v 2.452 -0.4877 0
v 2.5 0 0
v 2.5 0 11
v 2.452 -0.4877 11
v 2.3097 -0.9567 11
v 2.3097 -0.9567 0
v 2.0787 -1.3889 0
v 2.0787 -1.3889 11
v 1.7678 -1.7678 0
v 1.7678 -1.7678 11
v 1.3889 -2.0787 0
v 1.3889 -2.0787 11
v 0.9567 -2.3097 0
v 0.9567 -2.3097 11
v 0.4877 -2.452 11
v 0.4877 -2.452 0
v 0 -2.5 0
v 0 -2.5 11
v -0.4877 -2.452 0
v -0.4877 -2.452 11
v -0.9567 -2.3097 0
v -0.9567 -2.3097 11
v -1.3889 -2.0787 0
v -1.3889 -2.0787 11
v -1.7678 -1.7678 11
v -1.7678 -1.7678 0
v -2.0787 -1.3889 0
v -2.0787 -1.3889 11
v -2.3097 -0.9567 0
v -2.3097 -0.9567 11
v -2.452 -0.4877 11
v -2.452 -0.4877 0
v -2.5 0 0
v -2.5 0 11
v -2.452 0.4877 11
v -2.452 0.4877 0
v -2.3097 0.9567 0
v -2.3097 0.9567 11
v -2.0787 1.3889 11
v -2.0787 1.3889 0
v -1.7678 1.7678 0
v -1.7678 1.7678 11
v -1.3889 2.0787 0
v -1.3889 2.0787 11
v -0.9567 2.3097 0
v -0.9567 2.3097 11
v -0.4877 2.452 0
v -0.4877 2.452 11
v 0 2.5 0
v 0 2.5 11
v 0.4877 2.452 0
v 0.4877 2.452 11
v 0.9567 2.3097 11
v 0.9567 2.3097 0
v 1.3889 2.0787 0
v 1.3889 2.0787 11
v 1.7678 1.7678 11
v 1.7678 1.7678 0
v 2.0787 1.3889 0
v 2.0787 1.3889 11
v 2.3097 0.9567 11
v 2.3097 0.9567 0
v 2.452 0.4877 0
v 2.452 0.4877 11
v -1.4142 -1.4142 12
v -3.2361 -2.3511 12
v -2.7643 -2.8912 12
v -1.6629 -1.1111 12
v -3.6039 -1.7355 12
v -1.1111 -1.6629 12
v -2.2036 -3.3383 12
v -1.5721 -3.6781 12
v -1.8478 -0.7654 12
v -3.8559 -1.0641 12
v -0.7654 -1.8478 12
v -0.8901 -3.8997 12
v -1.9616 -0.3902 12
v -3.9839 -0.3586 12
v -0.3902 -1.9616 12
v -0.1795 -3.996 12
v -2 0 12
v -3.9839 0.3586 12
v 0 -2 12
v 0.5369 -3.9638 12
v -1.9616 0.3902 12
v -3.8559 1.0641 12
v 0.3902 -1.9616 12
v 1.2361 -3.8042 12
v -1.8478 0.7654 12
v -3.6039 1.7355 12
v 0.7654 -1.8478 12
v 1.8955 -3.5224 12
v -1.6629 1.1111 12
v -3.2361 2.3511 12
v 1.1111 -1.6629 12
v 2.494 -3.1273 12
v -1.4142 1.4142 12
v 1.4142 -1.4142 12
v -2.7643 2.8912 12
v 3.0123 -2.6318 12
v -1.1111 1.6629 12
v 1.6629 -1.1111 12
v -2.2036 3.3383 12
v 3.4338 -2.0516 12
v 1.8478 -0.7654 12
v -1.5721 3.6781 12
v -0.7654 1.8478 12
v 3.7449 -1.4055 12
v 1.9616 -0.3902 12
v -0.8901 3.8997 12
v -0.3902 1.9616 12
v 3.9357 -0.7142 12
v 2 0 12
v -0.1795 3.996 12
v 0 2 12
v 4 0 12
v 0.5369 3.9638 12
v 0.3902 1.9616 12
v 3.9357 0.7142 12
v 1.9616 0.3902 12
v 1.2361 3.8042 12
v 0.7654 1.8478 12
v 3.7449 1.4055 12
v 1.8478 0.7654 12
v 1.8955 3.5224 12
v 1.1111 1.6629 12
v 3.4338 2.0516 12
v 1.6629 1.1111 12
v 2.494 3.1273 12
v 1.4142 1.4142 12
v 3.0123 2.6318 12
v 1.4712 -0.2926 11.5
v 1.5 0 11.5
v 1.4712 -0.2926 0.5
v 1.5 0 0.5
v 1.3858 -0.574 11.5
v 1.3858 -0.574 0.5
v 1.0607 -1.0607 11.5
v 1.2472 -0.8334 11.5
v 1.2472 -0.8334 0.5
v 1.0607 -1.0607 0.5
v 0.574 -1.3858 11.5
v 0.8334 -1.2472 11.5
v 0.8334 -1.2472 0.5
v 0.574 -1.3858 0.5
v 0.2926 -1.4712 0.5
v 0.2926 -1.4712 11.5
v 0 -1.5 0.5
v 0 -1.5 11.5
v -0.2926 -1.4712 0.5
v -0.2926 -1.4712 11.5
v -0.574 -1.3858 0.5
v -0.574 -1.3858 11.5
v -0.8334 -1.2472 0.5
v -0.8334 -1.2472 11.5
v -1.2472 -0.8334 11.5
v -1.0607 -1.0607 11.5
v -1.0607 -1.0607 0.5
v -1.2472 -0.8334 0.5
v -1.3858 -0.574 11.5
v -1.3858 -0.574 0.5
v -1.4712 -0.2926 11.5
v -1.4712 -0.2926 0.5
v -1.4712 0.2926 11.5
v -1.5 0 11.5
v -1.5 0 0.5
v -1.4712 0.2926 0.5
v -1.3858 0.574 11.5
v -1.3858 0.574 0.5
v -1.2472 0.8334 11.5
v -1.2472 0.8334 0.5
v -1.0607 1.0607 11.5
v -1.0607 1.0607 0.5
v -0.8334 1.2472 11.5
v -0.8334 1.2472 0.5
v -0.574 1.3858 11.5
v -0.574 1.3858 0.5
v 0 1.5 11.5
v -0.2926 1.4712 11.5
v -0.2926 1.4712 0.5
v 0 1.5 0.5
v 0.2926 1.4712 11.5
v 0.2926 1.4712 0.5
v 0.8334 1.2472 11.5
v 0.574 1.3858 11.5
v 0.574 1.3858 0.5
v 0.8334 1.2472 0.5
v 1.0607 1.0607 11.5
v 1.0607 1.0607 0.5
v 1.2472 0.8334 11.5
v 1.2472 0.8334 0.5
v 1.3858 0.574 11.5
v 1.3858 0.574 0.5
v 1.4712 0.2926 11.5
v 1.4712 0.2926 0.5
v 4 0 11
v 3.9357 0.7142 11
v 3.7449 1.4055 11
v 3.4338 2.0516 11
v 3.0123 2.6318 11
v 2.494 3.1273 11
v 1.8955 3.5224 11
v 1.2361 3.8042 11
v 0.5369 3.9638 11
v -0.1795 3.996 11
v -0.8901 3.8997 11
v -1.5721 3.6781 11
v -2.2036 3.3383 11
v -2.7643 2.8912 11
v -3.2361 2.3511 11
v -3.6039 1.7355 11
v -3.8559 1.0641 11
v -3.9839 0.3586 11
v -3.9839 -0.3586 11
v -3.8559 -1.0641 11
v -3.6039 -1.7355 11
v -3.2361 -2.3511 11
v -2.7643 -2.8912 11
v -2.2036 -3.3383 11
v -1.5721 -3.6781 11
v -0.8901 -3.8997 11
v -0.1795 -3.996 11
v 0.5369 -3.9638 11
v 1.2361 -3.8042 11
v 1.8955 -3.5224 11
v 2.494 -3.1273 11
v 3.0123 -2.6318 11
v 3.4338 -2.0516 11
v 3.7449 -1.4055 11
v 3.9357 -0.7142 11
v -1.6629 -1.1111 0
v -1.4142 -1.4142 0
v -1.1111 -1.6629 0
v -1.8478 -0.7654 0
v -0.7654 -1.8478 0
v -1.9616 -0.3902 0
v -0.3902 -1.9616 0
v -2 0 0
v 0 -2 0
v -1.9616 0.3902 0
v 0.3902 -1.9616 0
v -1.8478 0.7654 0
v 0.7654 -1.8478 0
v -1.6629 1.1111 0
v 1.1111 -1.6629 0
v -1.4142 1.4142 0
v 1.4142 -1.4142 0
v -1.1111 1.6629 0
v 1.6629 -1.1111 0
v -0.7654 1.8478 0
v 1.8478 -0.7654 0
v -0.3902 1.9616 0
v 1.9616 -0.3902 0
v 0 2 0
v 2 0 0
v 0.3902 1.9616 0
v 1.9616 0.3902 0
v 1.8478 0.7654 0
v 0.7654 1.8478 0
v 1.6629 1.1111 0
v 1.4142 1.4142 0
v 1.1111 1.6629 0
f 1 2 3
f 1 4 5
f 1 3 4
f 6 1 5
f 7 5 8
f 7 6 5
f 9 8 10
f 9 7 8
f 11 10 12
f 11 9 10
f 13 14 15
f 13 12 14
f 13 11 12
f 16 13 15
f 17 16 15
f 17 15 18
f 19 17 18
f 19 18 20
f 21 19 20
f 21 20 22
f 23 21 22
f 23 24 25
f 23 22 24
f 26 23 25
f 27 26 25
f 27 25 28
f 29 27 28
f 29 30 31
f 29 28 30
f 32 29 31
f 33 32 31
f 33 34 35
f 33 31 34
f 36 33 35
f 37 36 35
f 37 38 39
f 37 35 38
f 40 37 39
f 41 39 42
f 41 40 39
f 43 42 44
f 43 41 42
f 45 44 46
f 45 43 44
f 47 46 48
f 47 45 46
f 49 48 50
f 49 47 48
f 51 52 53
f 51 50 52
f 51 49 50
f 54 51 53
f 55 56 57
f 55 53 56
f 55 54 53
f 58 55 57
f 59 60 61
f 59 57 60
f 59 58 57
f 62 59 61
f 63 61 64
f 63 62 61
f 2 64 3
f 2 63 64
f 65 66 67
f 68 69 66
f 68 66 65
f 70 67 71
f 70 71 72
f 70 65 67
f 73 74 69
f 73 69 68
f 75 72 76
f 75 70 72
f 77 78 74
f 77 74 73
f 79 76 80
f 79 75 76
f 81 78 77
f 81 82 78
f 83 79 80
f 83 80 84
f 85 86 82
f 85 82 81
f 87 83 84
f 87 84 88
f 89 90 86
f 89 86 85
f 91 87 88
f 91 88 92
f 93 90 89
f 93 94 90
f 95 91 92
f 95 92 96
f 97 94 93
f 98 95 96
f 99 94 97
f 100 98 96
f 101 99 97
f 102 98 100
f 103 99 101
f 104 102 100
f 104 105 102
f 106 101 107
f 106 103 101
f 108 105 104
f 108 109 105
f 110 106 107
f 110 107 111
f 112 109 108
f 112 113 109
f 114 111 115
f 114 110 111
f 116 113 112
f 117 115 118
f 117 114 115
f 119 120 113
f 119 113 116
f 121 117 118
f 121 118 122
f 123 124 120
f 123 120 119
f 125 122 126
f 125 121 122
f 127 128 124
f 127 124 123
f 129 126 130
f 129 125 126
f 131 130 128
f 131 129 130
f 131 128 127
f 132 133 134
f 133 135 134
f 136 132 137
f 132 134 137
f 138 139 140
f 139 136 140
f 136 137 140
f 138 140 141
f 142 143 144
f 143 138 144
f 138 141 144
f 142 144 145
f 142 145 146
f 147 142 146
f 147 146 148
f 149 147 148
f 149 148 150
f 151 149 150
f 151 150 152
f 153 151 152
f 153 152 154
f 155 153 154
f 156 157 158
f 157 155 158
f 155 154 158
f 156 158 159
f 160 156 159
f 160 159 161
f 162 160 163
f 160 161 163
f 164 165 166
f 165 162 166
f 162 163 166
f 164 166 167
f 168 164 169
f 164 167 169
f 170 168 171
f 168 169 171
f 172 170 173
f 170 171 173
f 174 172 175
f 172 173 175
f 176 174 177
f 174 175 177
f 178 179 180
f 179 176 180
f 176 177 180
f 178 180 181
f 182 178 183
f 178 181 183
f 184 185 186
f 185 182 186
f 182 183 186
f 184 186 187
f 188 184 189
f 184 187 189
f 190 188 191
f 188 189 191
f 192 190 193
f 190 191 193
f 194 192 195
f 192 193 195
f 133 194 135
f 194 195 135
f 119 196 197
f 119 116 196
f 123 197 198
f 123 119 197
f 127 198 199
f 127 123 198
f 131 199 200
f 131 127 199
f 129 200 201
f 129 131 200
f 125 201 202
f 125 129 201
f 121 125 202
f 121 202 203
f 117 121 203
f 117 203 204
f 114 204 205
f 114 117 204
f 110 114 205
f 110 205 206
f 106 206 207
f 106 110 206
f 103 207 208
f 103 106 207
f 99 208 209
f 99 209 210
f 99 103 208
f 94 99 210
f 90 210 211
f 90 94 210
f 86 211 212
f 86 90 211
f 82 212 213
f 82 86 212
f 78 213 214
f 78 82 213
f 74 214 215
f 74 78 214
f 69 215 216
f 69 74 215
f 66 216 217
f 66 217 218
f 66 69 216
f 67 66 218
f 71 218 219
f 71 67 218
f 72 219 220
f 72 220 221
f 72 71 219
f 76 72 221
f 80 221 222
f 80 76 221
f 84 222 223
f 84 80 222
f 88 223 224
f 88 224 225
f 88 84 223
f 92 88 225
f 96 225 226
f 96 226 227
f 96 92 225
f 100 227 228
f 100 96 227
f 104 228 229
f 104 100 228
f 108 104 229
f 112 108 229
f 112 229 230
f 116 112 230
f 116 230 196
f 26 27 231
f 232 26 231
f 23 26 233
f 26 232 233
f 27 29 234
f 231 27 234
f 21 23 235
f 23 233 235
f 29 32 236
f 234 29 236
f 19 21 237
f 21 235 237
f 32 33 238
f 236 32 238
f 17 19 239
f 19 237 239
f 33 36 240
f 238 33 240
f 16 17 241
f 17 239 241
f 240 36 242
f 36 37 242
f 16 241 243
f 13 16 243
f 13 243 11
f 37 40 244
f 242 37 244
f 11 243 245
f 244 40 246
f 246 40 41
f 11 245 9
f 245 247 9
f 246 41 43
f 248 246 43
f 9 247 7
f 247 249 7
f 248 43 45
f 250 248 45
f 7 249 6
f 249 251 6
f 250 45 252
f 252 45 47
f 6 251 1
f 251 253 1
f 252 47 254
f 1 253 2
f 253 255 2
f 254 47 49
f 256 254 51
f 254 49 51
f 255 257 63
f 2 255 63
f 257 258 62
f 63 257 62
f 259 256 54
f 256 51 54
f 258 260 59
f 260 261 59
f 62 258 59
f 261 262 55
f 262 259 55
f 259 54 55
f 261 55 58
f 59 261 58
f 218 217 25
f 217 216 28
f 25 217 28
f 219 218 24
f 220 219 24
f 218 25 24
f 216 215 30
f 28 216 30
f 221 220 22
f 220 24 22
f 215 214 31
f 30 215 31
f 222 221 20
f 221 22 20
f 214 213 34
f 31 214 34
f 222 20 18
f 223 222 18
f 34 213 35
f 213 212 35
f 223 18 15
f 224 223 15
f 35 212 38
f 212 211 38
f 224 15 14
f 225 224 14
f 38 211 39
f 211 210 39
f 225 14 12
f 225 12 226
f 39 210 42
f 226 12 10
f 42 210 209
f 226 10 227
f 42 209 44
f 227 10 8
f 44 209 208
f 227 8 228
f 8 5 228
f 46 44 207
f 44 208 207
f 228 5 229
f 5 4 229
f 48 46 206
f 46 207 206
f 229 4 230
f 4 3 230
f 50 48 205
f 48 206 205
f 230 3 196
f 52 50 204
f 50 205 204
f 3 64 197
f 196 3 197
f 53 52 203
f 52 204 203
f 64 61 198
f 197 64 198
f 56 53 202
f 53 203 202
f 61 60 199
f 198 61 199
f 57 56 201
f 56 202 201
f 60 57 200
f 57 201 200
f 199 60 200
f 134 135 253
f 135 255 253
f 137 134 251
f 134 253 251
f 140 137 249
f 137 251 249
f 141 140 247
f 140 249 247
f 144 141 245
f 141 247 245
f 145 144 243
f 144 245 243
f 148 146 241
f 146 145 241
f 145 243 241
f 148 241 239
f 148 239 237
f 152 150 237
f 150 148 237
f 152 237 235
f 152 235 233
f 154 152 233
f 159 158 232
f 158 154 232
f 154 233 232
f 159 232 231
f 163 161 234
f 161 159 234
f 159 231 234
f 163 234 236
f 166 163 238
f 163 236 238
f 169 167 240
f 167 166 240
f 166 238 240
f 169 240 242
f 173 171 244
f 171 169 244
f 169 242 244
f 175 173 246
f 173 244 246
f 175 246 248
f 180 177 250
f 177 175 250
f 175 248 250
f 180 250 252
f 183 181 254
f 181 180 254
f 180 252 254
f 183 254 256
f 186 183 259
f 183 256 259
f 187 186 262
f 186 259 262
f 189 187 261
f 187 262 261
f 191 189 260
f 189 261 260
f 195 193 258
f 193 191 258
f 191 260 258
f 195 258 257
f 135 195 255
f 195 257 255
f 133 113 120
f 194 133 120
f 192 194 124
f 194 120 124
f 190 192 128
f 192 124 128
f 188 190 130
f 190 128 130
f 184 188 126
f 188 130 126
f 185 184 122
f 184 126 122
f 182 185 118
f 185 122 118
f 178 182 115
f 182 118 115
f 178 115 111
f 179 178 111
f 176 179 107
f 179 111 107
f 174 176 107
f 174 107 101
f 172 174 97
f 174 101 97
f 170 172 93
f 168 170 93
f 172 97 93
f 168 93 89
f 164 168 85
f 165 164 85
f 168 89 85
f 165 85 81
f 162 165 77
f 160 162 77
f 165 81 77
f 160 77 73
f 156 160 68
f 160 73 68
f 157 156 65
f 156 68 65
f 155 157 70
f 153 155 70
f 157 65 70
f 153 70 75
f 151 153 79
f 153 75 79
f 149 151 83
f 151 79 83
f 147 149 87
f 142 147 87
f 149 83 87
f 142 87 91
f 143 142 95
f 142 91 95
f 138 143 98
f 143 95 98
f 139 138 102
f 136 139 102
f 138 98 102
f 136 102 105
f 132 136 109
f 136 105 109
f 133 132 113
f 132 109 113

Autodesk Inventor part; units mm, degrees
ref_plane "YZ Plane" through (0, 0, 0) normal (1, 0, 0) x (0, 1, 0)
ref_plane "XZ Plane" through (0, 0, 0) normal (0, 1, 0) x (-1, 0, 0)
ref_plane "XY Plane" through (0, 0, 0) normal (0, 0, 1) x (1, 0, 0)
sketch "Skizze1" plane through (0, 0, 0) normal (0, 0, 1) x (1, 0, 0)
  circle A0 centre (0, 0) radius 2.5
  circle A1 centre (0, 0) radius 1.5
  dimension "d0" = 1
  dimension "d1" = 5
extrude "Extrusion1" add sketch "Skizze1" along normal blind 12
chamfer "Fase1" distance 0.5 angle 45 2 edges at (-1.5, 0, 12) (-1.5, 0, 0)
sketch "Skizze2" plane through (0, 0, 12) normal (0, 0, 1) x (1, 0, 0)
  circle A0 centre (0, 0) radius 2.5 projected
  circle A1 centre (0, 0) radius 2 projected
  circle A2 centre (0, 0) radius 4
  dimension "d7" = 8
extrude "Extrusion2" add sketch "Skizze2" against normal blind 1 contours A2
properties part number "13_0204_048"
